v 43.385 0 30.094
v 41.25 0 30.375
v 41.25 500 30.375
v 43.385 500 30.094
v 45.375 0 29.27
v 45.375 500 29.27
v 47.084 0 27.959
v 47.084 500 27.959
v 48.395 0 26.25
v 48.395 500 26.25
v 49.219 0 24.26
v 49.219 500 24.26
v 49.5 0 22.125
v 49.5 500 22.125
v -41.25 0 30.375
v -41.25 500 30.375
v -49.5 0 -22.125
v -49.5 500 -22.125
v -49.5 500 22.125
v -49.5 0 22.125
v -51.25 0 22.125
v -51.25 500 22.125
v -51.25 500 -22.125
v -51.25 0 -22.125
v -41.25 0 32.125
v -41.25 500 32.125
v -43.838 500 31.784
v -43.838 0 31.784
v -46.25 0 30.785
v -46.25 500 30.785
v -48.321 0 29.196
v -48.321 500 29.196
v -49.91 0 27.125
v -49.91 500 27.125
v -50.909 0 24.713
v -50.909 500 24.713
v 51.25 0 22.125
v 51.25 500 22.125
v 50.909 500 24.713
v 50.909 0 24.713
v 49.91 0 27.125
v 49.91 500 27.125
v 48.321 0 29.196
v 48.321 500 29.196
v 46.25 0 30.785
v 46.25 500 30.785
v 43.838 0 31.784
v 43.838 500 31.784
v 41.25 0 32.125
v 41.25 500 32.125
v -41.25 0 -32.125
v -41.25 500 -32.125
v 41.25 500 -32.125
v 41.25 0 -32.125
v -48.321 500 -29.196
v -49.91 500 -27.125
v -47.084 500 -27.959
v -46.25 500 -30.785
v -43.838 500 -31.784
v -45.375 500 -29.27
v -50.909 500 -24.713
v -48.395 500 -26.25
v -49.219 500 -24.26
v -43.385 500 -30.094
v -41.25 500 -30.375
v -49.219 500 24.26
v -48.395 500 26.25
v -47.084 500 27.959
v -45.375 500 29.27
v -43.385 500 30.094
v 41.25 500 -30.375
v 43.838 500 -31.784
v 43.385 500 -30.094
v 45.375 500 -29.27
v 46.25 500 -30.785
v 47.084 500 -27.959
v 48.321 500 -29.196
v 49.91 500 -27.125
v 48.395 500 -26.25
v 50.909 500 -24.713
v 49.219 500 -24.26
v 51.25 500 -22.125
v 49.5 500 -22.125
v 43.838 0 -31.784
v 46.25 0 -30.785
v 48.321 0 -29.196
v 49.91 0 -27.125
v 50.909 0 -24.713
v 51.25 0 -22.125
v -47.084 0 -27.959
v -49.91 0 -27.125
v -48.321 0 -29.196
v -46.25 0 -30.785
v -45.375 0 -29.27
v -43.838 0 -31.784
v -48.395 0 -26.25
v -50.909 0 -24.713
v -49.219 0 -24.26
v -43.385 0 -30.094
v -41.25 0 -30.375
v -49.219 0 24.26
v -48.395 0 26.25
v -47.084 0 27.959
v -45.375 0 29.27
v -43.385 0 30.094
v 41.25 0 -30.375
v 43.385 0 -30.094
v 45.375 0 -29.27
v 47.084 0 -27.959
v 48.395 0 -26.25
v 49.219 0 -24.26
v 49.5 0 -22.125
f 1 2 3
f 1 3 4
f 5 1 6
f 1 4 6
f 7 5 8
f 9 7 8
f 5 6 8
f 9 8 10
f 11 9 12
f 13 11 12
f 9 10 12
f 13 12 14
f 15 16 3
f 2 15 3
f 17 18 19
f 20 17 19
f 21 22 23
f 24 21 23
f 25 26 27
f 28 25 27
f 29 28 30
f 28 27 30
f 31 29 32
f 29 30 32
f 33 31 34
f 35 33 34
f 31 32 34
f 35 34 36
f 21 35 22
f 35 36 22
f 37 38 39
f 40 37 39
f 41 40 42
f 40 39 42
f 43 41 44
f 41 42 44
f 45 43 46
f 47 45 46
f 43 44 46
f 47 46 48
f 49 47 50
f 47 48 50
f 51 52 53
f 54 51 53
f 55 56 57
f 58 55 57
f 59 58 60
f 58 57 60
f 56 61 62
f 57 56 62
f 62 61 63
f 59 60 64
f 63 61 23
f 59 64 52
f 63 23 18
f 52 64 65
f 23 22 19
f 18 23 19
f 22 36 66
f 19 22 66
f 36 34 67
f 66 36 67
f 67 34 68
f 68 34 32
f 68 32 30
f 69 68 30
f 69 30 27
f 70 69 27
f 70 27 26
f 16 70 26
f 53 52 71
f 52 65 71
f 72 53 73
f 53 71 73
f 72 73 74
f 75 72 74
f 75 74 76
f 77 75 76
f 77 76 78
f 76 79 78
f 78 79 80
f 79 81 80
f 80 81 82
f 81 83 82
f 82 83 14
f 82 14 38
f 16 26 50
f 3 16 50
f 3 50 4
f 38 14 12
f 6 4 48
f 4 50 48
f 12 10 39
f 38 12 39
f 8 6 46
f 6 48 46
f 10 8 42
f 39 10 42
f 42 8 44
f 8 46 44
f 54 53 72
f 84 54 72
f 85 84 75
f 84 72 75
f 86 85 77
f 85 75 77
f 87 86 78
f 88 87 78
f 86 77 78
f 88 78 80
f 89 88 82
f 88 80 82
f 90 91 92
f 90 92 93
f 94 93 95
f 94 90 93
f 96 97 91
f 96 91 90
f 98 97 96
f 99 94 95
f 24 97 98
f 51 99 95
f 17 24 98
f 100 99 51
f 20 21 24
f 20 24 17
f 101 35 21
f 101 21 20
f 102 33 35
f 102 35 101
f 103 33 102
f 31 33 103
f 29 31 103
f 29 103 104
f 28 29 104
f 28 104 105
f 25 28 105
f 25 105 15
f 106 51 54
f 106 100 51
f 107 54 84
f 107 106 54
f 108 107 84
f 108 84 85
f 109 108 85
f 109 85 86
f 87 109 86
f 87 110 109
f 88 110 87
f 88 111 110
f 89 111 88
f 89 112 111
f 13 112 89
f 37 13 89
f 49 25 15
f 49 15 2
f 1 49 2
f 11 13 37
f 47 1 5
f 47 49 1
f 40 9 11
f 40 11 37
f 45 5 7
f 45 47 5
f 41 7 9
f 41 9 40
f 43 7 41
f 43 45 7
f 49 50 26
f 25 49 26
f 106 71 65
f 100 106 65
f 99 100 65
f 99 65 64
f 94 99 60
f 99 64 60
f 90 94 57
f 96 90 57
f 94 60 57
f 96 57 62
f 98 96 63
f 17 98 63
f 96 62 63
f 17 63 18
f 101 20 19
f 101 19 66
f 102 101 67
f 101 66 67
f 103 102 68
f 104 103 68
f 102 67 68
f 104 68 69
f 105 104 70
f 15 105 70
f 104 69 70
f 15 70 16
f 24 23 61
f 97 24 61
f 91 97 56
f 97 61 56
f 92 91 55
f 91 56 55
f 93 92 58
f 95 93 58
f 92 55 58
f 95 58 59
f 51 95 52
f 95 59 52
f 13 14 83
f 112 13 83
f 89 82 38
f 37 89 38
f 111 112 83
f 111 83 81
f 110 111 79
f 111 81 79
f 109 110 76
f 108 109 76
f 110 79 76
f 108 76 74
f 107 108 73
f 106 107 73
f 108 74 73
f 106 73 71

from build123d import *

# Parameters (mm, degrees)
F1_DEPTH = 300


# Not quite as in the source:
# - a pattern or mirror of a feature is missing from the dataset's text; its kind, count and spacing are read off the source's solid


with BuildPart() as f1:
    # F0 (on Front) → F1 (new body)
    with BuildSketch(Plane.XZ):
        with BuildLine():
            ThreePointArc((51.25, 22.125), (48.3210678119, 29.1960678119), (41.25, 32.125))
            Line((41.25, 32.125), (-41.25, 32.125))
            ThreePointArc((-41.25, 32.125), (-48.3210678119, 29.1960678119), (-51.25, 22.125))
            Line((-51.25, 22.125), (-51.25, -22.125))
            ThreePointArc((-51.25, -22.125), (-48.3210678119, -29.1960678119), (-41.25, -32.125))
            Line((-41.25, -32.125), (41.25, -32.125))
            ThreePointArc((41.25, -32.125), (48.3210678119, -29.1960678119), (51.25, -22.125))
            Line((51.25, -22.125), (51.25, 22.125))
        make_face()
        with BuildLine():
            Line((-49.5, -22.125), (-49.5, 22.125))
            ThreePointArc((-49.5, 22.125), (-47.0836309448, 27.9586309448), (-41.25, 30.375))
            Line((-41.25, 30.375), (41.25, 30.375))
            ThreePointArc((41.25, 30.375), (47.0836309448, 27.9586309448), (49.5, 22.125))
            Line((49.5, 22.125), (49.5, -22.125))
            ThreePointArc((49.5, -22.125), (47.0836309448, -27.9586309448), (41.25, -30.375))
            Line((41.25, -30.375), (-41.25, -30.375))
            ThreePointArc((-41.25, -30.375), (-47.0836309448, -27.9586309448), (-49.5, -22.125))
        make_face(mode=Mode.SUBTRACT)
    extrude(amount=-F1_DEPTH)

    # F1_copies: F1 across plane


with BuildPart() as f1_1:
    add(f1.part)
    add(f1.part.mirror(Plane.ZX.offset(250)))


solid = f1_1.part
